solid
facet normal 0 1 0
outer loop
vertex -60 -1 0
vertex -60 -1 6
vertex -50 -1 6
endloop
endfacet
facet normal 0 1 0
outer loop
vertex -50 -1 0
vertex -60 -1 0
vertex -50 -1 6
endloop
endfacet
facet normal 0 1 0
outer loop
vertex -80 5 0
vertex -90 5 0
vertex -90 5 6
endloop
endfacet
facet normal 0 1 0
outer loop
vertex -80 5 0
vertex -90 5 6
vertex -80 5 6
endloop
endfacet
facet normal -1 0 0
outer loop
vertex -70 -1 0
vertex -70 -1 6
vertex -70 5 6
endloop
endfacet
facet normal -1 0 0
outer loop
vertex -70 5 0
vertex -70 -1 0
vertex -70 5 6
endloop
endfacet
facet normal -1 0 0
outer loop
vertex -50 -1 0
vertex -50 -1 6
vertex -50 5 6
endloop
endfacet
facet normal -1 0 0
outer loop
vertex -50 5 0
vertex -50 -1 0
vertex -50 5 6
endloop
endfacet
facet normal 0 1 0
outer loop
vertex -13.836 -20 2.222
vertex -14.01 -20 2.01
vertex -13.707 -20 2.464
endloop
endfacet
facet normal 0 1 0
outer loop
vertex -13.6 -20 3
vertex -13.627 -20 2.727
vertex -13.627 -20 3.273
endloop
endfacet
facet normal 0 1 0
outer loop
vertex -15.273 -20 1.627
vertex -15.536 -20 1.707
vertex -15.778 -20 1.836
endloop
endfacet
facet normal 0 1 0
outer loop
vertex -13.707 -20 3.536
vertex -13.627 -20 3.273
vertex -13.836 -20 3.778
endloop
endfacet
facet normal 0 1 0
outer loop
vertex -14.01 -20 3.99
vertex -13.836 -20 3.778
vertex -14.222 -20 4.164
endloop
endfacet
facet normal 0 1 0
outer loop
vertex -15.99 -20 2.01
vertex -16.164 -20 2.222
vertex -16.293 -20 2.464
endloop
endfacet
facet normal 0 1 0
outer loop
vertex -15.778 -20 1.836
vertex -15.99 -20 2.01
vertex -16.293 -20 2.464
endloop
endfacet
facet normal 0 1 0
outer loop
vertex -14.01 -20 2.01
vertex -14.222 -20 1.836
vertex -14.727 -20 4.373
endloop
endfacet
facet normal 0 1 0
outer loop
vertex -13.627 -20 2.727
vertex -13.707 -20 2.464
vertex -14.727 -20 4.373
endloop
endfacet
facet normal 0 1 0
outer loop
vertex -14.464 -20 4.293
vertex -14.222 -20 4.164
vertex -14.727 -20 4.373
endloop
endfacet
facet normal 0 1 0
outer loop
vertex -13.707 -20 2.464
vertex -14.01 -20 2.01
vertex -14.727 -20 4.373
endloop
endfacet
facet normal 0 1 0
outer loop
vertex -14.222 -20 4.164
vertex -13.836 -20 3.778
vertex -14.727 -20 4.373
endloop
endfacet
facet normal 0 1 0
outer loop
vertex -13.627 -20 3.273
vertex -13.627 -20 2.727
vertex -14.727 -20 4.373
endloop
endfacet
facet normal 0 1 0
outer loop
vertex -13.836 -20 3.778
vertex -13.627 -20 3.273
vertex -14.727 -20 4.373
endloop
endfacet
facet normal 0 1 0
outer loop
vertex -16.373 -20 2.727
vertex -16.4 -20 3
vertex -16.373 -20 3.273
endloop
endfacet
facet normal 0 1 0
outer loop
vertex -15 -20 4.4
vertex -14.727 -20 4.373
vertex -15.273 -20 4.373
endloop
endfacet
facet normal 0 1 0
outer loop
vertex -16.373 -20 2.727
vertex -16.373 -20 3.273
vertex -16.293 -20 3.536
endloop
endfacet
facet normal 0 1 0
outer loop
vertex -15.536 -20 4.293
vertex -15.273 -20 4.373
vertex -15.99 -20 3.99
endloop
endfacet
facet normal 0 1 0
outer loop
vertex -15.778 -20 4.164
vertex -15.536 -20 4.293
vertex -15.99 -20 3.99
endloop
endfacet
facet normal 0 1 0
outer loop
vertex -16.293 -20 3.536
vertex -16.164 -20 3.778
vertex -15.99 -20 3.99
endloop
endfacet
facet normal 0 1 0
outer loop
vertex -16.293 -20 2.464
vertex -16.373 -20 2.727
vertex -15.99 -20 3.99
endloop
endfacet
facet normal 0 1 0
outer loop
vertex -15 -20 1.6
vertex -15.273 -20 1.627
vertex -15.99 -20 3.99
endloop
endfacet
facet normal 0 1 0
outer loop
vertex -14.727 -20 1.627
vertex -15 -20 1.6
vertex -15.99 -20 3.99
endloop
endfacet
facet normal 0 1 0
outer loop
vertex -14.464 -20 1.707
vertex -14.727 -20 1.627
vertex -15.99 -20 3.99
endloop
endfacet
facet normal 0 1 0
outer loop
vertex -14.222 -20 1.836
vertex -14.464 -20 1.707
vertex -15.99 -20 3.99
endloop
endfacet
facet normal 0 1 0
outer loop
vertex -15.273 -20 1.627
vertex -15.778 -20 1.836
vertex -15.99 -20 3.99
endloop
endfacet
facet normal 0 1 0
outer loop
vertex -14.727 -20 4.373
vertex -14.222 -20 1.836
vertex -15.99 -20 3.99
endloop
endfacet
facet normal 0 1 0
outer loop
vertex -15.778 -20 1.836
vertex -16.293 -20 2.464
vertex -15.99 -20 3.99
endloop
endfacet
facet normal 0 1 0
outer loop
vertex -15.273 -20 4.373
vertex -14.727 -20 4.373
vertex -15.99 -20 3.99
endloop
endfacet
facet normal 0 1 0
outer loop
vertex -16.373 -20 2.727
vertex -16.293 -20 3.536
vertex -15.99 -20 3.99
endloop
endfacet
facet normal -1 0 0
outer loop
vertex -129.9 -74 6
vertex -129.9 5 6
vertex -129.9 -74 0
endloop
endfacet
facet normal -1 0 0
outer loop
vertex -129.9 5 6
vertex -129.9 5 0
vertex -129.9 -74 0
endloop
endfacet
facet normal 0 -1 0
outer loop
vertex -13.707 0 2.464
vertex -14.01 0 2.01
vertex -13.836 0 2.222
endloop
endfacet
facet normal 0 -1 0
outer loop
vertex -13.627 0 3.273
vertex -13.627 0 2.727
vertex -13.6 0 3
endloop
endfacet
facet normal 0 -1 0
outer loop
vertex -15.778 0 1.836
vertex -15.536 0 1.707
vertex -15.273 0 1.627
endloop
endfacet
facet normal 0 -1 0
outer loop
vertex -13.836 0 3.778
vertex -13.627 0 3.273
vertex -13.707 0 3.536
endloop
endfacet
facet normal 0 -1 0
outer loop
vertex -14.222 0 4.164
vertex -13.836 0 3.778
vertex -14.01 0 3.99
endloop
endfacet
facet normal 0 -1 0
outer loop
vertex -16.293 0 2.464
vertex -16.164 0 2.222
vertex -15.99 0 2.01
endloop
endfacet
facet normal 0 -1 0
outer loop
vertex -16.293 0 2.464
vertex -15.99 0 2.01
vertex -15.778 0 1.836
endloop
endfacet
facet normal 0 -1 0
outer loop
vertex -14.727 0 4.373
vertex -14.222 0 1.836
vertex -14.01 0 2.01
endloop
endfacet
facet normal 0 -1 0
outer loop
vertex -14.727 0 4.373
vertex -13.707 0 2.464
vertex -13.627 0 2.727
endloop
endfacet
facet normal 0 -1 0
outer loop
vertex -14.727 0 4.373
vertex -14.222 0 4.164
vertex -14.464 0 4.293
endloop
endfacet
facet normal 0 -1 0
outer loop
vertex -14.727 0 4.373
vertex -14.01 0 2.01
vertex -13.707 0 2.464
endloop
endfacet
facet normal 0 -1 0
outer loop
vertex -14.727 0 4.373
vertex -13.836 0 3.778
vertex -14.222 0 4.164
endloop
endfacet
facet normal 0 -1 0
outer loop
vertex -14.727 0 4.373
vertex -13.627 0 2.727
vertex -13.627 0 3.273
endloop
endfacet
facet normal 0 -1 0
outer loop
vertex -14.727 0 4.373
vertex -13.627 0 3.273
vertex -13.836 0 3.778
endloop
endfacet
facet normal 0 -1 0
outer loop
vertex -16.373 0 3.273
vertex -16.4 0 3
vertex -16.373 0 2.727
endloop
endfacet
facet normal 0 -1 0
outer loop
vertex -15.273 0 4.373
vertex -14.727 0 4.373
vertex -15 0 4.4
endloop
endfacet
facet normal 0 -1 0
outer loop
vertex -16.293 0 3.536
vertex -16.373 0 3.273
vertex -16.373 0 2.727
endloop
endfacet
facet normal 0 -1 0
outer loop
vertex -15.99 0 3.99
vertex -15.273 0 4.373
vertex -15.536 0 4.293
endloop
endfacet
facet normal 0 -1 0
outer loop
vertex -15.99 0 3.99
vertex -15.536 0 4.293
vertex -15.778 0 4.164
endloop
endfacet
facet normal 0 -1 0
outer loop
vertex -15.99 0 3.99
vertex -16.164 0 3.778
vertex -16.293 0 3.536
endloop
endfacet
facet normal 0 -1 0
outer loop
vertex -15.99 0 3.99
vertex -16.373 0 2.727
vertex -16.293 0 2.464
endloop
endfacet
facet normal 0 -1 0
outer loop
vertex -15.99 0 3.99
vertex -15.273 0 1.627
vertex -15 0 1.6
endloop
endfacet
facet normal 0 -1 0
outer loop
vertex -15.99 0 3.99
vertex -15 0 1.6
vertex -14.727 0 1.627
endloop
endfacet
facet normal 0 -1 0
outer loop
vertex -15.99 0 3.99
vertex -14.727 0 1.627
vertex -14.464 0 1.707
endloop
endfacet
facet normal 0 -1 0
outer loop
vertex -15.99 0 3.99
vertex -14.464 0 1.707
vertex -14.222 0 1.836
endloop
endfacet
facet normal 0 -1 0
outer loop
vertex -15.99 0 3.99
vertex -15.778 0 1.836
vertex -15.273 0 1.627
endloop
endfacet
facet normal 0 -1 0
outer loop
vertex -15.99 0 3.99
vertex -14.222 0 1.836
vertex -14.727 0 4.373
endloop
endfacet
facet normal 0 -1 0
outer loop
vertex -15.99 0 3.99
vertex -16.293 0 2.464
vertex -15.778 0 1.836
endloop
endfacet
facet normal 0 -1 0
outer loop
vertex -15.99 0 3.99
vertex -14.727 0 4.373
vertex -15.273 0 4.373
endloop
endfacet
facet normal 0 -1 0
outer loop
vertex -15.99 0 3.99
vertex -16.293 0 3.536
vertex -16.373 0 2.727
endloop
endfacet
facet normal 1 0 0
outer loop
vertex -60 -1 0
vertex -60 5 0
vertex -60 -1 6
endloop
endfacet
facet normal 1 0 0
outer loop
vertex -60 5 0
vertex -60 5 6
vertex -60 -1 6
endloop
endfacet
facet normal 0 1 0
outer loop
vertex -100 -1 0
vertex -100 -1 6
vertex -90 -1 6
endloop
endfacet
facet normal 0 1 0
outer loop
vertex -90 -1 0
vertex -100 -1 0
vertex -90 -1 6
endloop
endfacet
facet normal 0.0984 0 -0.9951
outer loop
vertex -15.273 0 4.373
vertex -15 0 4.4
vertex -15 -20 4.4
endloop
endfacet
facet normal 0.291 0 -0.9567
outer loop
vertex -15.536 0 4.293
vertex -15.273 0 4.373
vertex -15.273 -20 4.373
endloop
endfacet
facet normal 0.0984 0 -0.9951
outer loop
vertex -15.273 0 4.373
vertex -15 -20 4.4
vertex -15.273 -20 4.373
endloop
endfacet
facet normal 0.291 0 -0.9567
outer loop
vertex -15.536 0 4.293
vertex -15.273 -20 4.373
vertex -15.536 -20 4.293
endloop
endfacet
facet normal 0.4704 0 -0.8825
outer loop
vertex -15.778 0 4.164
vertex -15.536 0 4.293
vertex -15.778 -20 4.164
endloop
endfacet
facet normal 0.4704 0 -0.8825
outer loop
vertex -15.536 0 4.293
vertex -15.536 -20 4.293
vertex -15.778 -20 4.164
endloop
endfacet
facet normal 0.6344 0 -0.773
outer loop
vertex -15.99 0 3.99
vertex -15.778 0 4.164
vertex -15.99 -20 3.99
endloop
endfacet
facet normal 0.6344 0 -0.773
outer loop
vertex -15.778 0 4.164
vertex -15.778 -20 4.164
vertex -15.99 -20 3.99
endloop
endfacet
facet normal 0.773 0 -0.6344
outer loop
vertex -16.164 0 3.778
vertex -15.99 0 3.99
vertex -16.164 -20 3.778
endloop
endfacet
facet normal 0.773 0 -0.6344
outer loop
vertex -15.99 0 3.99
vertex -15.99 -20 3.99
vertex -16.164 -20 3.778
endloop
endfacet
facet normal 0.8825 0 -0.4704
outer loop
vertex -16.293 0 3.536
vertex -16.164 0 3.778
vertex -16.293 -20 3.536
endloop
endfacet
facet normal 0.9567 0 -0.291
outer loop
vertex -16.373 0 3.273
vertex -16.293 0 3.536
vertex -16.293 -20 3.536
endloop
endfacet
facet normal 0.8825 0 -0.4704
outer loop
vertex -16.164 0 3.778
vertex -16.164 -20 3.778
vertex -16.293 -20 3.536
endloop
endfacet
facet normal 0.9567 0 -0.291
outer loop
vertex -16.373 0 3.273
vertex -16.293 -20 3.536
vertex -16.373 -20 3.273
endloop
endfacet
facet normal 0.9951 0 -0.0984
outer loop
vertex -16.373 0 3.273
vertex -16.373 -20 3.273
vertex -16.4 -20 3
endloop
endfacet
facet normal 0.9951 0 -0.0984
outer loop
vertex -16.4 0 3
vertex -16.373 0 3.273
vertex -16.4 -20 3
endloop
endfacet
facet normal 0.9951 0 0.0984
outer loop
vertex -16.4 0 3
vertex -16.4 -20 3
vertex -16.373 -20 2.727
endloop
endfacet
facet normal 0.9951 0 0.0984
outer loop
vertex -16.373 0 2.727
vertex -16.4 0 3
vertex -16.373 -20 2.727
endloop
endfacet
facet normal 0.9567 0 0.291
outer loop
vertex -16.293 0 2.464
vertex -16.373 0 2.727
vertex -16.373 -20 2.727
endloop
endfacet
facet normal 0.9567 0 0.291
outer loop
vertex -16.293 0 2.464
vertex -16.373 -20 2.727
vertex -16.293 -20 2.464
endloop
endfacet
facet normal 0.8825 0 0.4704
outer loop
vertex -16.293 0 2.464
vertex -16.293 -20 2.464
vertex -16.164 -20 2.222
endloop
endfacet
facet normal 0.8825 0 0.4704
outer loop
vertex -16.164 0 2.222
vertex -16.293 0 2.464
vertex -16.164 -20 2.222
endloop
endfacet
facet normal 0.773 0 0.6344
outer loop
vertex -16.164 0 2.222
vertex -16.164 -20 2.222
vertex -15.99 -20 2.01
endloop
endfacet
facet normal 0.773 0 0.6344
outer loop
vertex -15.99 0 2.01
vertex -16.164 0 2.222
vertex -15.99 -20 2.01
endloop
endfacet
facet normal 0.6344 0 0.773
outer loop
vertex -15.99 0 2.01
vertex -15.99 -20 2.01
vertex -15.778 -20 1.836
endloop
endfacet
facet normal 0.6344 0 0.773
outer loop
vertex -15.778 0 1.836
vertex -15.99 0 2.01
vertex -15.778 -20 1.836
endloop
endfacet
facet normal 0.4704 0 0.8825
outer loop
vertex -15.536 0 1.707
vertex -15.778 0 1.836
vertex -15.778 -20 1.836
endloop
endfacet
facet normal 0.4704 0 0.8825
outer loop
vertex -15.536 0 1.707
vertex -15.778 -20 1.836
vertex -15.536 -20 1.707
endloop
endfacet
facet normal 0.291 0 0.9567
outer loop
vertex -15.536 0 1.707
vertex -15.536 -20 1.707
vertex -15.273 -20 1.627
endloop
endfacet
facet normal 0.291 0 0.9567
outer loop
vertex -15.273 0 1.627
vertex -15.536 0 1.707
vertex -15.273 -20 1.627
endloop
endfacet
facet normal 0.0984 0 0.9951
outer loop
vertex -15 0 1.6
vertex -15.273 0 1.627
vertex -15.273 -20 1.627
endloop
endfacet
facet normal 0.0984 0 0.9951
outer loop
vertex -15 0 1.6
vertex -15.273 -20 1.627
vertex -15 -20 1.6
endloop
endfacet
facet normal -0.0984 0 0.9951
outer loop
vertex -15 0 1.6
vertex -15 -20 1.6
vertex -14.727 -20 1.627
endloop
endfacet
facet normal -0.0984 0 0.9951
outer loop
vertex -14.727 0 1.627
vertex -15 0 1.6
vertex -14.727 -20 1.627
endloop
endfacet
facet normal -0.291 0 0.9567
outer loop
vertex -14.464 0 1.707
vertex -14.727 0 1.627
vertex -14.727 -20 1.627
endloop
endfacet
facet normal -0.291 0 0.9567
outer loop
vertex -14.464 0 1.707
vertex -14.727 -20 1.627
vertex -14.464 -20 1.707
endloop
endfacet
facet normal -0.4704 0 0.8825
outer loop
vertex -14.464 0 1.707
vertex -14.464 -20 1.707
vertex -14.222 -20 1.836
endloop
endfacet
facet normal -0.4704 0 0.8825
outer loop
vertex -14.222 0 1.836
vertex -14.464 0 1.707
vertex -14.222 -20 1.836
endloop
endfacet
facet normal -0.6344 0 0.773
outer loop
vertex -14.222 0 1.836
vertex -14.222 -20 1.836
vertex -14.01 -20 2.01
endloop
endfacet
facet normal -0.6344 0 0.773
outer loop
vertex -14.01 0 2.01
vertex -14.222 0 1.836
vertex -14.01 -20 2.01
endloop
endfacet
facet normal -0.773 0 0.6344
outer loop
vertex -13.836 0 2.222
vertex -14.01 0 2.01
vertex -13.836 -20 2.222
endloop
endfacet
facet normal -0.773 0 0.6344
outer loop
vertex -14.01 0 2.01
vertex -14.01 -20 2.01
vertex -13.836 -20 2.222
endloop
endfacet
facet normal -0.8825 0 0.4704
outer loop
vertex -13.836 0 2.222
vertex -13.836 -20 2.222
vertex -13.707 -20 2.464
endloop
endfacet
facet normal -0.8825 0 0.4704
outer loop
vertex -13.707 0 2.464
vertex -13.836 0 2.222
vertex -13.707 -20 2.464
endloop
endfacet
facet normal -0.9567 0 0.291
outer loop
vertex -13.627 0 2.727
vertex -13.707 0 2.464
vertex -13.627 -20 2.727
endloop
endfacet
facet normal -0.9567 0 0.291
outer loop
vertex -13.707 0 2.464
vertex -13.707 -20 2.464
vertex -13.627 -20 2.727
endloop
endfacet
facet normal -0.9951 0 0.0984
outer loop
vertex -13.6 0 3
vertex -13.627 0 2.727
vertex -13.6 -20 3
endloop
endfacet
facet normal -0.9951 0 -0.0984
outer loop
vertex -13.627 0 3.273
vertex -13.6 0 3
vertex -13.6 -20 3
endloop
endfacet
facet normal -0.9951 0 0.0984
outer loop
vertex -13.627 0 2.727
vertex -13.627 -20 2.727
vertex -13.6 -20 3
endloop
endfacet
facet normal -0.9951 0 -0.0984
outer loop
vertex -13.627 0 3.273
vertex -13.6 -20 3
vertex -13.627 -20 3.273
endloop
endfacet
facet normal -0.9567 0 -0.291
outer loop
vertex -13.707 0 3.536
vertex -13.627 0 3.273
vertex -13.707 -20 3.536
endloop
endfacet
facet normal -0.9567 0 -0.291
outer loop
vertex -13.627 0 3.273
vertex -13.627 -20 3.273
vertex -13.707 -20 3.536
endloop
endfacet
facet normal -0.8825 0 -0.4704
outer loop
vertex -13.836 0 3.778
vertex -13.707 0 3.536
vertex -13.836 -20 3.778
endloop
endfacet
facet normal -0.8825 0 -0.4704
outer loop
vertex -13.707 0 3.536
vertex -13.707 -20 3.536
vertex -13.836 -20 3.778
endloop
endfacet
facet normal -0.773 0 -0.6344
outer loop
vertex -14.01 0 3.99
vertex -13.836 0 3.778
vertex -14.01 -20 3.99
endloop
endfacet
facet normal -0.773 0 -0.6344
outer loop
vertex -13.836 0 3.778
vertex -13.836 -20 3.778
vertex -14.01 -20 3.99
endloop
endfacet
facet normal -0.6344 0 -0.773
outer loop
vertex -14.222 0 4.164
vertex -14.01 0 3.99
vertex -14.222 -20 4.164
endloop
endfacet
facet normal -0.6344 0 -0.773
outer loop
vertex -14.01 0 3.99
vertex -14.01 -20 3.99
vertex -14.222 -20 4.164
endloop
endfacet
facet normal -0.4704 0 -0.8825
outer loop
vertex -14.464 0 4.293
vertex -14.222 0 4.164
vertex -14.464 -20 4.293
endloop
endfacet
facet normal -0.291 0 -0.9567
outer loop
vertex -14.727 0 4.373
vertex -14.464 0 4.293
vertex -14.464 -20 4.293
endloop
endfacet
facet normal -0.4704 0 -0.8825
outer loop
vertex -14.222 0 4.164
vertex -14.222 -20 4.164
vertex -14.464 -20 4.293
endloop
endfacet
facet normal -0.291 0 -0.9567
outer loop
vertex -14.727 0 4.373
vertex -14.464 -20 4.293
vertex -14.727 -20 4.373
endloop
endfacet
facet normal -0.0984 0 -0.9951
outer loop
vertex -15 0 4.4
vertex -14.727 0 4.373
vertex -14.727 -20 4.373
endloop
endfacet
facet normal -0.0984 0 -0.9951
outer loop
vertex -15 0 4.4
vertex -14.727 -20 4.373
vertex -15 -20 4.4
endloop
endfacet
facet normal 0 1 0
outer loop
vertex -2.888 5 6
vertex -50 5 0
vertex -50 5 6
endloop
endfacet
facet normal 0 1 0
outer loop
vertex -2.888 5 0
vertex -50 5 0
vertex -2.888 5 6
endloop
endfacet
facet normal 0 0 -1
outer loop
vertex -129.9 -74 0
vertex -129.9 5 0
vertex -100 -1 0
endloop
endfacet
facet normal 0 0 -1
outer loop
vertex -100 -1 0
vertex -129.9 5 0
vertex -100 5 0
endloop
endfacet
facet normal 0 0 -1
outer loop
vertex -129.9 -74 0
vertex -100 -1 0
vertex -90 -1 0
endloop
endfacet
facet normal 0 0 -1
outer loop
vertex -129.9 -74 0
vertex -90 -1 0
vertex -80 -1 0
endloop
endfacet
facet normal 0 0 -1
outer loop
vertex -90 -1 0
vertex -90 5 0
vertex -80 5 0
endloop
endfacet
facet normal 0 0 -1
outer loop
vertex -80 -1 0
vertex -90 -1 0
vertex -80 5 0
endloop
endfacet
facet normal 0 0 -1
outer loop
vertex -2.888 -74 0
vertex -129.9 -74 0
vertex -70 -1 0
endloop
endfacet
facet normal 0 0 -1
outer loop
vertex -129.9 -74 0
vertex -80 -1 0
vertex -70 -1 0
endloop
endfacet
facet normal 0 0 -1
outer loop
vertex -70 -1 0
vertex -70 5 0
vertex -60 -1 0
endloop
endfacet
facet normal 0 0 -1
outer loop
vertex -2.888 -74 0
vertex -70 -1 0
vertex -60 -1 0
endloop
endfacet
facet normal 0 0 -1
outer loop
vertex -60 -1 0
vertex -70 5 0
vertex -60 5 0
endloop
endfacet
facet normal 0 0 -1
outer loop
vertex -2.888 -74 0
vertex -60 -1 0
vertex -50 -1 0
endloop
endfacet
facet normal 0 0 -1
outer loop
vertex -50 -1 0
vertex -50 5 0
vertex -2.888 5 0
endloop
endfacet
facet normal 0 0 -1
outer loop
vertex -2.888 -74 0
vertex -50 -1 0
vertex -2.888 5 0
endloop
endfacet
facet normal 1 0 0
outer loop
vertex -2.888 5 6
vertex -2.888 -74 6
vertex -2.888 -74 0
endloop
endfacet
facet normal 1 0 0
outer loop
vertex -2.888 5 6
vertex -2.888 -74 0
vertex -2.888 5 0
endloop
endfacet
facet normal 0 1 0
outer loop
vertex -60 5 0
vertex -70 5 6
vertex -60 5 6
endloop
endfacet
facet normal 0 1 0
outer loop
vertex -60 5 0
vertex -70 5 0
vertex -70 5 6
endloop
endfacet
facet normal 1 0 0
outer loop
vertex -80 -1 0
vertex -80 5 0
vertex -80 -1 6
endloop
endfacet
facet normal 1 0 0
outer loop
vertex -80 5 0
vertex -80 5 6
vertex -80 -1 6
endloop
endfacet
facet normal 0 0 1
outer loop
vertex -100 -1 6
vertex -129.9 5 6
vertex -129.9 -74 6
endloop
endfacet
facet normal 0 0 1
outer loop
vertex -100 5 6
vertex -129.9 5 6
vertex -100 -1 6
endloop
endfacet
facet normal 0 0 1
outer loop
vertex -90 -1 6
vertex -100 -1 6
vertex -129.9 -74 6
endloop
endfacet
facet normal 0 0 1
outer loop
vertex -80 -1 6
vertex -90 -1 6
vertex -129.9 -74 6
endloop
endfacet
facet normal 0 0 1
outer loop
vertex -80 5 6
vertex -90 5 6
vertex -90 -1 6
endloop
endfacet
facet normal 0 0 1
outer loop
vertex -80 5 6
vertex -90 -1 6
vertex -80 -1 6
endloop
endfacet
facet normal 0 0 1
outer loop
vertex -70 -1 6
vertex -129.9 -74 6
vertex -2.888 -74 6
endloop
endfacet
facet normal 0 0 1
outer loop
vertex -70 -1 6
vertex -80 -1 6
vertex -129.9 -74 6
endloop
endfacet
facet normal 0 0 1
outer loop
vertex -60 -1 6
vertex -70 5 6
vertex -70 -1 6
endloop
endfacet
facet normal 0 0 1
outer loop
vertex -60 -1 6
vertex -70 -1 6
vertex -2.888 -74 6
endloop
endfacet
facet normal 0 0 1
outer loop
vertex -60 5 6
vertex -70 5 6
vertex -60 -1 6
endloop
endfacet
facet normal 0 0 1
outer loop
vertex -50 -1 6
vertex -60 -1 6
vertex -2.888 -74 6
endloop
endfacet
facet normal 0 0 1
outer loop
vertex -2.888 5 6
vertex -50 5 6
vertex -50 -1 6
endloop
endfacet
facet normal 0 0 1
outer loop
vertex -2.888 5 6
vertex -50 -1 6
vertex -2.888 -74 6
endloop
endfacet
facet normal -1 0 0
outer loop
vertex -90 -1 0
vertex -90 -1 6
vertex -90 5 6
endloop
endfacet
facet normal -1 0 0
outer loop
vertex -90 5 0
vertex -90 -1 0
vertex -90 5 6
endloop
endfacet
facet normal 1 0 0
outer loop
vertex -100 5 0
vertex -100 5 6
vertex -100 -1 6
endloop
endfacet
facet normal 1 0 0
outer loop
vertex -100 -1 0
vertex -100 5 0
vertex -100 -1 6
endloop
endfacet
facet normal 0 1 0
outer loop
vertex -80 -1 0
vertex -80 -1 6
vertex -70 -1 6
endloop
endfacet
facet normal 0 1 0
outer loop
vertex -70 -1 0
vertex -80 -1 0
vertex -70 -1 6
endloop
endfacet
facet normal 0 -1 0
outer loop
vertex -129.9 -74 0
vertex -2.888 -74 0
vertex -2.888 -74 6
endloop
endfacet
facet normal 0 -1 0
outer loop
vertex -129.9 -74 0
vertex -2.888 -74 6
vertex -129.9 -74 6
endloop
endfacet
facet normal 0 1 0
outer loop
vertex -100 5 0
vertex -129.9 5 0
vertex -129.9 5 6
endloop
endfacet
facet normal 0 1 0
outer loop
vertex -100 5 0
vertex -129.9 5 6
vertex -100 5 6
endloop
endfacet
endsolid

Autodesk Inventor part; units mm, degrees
ref_plane "YZ Plane" through (0, 0, 0) normal (1, 0, 0) x (0, 1, 0)
ref_plane "XZ Plane" through (0, 0, 0) normal (0, 1, 0) x (-1, 0, 0)
ref_plane "XY Plane" through (0, 0, 0) normal (0, 0, 1) x (1, 0, 0)
sketch "Sketch1" plane through (0, 0, 0) normal (0, 0, 1) x (1, 0, 0)
  line L0 (0, -129) -> (0, 146.2673) projected
  line L1 (-130, -1) -> (-130, 5) projected
  line L2 (-10, 5) -> (0, 5) projected
  line L3 (0, -74) -> (-450, -74) projected
  line L4 (-130, 5) -> (-120, 5) projected
  line L5 (0, -74) -> (-129.8, -74) projected
  line L6 (-129.8, -68) -> (-129.8, -74) projected
  line L7 (0, 5) -> (-129.9001, 5)
  line L8 (-129.9001, 5) -> (-129.9001, -74)
  line L9 (-129.9001, -74) -> (0, -74)
  line L10 (0, -74) -> (0, 5)
  line L11 (-155.5538, 0) -> (-155.5538, 5) projected
  line L12 (-170.1, 0) -> (-170.1, 5) projected
  point P0 (0, 0)
  point P1 (-129.9001, -74)
  point P2 (-120, 5)
  point P3 (-130, 0)
  point P4 (-129.9001, 5)
  point P5 (-129.9001, 5)
extrude "Extrusion1" add sketch "Sketch1" along normal blind 6
ref_plane "Work Plane2" through (-20.1, 0, 6) normal (0, 1, 0) x (1, 0, 0)
sketch "Sketch3" plane through (-20.1, 0, 6) normal (0, 1, 0) x (1, 0, 0)
  circle A0 centre (5.1, 3) radius 1.5 projected
  point P0 (20.1, 6)
hole "Hole1" at (-15, 0, 3) direction (0, -1, 0) diameter 2.8 depth 20
ref_plane "Work Plane1" through (-129.9001, -34.5, 0) normal (0, -1, 0) x (1, 0, 0)
sketch "Skizze4" plane through (0, 0, 6) normal (0, 0, 1) x (1, 0, 0)
  line L0 (-2.3877, -54.9) -> (-2.3877, -60) projected
  line L1 (16.4895, -81.7963) -> (-2.8877, -81.7963)
  line L2 (-2.8877, -81.7963) -> (-2.8877, 13.3495)
  line L3 (-2.8877, 13.3495) -> (16.4895, 13.3495)
  line L4 (16.4895, 13.3495) -> (16.4895, -81.7963)
  point P0 (0, 0)
  dimension "d23" = 0.5
extrude "Extrusion3" cut sketch "Skizze4" against normal blind 10
sketch "Sketch6" plane through (0, 0, 6) normal (0, 0, 1) x (1, 0, 0)
  line L0 (-100, 5) -> (-100, -1) projected
  line L1 (-100, -1) -> (-90, -1) projected
  line L2 (-90, -1) -> (-90, 5) projected
  line L3 (-2.8877, 5) -> (-129.9001, 5) projected
  point P0 (0, 0)
  point P1 (-100, 5)
  point P2 (-90, 5)
extrude "Extrusion5" cut sketch "Sketch6" against normal through all
pattern_linear "Rectangular Pattern3" count 3 spacing 20 along (1, 0, 0) of "Extrusion5"
properties part number "00_Baseplate_Simmo_side6"
